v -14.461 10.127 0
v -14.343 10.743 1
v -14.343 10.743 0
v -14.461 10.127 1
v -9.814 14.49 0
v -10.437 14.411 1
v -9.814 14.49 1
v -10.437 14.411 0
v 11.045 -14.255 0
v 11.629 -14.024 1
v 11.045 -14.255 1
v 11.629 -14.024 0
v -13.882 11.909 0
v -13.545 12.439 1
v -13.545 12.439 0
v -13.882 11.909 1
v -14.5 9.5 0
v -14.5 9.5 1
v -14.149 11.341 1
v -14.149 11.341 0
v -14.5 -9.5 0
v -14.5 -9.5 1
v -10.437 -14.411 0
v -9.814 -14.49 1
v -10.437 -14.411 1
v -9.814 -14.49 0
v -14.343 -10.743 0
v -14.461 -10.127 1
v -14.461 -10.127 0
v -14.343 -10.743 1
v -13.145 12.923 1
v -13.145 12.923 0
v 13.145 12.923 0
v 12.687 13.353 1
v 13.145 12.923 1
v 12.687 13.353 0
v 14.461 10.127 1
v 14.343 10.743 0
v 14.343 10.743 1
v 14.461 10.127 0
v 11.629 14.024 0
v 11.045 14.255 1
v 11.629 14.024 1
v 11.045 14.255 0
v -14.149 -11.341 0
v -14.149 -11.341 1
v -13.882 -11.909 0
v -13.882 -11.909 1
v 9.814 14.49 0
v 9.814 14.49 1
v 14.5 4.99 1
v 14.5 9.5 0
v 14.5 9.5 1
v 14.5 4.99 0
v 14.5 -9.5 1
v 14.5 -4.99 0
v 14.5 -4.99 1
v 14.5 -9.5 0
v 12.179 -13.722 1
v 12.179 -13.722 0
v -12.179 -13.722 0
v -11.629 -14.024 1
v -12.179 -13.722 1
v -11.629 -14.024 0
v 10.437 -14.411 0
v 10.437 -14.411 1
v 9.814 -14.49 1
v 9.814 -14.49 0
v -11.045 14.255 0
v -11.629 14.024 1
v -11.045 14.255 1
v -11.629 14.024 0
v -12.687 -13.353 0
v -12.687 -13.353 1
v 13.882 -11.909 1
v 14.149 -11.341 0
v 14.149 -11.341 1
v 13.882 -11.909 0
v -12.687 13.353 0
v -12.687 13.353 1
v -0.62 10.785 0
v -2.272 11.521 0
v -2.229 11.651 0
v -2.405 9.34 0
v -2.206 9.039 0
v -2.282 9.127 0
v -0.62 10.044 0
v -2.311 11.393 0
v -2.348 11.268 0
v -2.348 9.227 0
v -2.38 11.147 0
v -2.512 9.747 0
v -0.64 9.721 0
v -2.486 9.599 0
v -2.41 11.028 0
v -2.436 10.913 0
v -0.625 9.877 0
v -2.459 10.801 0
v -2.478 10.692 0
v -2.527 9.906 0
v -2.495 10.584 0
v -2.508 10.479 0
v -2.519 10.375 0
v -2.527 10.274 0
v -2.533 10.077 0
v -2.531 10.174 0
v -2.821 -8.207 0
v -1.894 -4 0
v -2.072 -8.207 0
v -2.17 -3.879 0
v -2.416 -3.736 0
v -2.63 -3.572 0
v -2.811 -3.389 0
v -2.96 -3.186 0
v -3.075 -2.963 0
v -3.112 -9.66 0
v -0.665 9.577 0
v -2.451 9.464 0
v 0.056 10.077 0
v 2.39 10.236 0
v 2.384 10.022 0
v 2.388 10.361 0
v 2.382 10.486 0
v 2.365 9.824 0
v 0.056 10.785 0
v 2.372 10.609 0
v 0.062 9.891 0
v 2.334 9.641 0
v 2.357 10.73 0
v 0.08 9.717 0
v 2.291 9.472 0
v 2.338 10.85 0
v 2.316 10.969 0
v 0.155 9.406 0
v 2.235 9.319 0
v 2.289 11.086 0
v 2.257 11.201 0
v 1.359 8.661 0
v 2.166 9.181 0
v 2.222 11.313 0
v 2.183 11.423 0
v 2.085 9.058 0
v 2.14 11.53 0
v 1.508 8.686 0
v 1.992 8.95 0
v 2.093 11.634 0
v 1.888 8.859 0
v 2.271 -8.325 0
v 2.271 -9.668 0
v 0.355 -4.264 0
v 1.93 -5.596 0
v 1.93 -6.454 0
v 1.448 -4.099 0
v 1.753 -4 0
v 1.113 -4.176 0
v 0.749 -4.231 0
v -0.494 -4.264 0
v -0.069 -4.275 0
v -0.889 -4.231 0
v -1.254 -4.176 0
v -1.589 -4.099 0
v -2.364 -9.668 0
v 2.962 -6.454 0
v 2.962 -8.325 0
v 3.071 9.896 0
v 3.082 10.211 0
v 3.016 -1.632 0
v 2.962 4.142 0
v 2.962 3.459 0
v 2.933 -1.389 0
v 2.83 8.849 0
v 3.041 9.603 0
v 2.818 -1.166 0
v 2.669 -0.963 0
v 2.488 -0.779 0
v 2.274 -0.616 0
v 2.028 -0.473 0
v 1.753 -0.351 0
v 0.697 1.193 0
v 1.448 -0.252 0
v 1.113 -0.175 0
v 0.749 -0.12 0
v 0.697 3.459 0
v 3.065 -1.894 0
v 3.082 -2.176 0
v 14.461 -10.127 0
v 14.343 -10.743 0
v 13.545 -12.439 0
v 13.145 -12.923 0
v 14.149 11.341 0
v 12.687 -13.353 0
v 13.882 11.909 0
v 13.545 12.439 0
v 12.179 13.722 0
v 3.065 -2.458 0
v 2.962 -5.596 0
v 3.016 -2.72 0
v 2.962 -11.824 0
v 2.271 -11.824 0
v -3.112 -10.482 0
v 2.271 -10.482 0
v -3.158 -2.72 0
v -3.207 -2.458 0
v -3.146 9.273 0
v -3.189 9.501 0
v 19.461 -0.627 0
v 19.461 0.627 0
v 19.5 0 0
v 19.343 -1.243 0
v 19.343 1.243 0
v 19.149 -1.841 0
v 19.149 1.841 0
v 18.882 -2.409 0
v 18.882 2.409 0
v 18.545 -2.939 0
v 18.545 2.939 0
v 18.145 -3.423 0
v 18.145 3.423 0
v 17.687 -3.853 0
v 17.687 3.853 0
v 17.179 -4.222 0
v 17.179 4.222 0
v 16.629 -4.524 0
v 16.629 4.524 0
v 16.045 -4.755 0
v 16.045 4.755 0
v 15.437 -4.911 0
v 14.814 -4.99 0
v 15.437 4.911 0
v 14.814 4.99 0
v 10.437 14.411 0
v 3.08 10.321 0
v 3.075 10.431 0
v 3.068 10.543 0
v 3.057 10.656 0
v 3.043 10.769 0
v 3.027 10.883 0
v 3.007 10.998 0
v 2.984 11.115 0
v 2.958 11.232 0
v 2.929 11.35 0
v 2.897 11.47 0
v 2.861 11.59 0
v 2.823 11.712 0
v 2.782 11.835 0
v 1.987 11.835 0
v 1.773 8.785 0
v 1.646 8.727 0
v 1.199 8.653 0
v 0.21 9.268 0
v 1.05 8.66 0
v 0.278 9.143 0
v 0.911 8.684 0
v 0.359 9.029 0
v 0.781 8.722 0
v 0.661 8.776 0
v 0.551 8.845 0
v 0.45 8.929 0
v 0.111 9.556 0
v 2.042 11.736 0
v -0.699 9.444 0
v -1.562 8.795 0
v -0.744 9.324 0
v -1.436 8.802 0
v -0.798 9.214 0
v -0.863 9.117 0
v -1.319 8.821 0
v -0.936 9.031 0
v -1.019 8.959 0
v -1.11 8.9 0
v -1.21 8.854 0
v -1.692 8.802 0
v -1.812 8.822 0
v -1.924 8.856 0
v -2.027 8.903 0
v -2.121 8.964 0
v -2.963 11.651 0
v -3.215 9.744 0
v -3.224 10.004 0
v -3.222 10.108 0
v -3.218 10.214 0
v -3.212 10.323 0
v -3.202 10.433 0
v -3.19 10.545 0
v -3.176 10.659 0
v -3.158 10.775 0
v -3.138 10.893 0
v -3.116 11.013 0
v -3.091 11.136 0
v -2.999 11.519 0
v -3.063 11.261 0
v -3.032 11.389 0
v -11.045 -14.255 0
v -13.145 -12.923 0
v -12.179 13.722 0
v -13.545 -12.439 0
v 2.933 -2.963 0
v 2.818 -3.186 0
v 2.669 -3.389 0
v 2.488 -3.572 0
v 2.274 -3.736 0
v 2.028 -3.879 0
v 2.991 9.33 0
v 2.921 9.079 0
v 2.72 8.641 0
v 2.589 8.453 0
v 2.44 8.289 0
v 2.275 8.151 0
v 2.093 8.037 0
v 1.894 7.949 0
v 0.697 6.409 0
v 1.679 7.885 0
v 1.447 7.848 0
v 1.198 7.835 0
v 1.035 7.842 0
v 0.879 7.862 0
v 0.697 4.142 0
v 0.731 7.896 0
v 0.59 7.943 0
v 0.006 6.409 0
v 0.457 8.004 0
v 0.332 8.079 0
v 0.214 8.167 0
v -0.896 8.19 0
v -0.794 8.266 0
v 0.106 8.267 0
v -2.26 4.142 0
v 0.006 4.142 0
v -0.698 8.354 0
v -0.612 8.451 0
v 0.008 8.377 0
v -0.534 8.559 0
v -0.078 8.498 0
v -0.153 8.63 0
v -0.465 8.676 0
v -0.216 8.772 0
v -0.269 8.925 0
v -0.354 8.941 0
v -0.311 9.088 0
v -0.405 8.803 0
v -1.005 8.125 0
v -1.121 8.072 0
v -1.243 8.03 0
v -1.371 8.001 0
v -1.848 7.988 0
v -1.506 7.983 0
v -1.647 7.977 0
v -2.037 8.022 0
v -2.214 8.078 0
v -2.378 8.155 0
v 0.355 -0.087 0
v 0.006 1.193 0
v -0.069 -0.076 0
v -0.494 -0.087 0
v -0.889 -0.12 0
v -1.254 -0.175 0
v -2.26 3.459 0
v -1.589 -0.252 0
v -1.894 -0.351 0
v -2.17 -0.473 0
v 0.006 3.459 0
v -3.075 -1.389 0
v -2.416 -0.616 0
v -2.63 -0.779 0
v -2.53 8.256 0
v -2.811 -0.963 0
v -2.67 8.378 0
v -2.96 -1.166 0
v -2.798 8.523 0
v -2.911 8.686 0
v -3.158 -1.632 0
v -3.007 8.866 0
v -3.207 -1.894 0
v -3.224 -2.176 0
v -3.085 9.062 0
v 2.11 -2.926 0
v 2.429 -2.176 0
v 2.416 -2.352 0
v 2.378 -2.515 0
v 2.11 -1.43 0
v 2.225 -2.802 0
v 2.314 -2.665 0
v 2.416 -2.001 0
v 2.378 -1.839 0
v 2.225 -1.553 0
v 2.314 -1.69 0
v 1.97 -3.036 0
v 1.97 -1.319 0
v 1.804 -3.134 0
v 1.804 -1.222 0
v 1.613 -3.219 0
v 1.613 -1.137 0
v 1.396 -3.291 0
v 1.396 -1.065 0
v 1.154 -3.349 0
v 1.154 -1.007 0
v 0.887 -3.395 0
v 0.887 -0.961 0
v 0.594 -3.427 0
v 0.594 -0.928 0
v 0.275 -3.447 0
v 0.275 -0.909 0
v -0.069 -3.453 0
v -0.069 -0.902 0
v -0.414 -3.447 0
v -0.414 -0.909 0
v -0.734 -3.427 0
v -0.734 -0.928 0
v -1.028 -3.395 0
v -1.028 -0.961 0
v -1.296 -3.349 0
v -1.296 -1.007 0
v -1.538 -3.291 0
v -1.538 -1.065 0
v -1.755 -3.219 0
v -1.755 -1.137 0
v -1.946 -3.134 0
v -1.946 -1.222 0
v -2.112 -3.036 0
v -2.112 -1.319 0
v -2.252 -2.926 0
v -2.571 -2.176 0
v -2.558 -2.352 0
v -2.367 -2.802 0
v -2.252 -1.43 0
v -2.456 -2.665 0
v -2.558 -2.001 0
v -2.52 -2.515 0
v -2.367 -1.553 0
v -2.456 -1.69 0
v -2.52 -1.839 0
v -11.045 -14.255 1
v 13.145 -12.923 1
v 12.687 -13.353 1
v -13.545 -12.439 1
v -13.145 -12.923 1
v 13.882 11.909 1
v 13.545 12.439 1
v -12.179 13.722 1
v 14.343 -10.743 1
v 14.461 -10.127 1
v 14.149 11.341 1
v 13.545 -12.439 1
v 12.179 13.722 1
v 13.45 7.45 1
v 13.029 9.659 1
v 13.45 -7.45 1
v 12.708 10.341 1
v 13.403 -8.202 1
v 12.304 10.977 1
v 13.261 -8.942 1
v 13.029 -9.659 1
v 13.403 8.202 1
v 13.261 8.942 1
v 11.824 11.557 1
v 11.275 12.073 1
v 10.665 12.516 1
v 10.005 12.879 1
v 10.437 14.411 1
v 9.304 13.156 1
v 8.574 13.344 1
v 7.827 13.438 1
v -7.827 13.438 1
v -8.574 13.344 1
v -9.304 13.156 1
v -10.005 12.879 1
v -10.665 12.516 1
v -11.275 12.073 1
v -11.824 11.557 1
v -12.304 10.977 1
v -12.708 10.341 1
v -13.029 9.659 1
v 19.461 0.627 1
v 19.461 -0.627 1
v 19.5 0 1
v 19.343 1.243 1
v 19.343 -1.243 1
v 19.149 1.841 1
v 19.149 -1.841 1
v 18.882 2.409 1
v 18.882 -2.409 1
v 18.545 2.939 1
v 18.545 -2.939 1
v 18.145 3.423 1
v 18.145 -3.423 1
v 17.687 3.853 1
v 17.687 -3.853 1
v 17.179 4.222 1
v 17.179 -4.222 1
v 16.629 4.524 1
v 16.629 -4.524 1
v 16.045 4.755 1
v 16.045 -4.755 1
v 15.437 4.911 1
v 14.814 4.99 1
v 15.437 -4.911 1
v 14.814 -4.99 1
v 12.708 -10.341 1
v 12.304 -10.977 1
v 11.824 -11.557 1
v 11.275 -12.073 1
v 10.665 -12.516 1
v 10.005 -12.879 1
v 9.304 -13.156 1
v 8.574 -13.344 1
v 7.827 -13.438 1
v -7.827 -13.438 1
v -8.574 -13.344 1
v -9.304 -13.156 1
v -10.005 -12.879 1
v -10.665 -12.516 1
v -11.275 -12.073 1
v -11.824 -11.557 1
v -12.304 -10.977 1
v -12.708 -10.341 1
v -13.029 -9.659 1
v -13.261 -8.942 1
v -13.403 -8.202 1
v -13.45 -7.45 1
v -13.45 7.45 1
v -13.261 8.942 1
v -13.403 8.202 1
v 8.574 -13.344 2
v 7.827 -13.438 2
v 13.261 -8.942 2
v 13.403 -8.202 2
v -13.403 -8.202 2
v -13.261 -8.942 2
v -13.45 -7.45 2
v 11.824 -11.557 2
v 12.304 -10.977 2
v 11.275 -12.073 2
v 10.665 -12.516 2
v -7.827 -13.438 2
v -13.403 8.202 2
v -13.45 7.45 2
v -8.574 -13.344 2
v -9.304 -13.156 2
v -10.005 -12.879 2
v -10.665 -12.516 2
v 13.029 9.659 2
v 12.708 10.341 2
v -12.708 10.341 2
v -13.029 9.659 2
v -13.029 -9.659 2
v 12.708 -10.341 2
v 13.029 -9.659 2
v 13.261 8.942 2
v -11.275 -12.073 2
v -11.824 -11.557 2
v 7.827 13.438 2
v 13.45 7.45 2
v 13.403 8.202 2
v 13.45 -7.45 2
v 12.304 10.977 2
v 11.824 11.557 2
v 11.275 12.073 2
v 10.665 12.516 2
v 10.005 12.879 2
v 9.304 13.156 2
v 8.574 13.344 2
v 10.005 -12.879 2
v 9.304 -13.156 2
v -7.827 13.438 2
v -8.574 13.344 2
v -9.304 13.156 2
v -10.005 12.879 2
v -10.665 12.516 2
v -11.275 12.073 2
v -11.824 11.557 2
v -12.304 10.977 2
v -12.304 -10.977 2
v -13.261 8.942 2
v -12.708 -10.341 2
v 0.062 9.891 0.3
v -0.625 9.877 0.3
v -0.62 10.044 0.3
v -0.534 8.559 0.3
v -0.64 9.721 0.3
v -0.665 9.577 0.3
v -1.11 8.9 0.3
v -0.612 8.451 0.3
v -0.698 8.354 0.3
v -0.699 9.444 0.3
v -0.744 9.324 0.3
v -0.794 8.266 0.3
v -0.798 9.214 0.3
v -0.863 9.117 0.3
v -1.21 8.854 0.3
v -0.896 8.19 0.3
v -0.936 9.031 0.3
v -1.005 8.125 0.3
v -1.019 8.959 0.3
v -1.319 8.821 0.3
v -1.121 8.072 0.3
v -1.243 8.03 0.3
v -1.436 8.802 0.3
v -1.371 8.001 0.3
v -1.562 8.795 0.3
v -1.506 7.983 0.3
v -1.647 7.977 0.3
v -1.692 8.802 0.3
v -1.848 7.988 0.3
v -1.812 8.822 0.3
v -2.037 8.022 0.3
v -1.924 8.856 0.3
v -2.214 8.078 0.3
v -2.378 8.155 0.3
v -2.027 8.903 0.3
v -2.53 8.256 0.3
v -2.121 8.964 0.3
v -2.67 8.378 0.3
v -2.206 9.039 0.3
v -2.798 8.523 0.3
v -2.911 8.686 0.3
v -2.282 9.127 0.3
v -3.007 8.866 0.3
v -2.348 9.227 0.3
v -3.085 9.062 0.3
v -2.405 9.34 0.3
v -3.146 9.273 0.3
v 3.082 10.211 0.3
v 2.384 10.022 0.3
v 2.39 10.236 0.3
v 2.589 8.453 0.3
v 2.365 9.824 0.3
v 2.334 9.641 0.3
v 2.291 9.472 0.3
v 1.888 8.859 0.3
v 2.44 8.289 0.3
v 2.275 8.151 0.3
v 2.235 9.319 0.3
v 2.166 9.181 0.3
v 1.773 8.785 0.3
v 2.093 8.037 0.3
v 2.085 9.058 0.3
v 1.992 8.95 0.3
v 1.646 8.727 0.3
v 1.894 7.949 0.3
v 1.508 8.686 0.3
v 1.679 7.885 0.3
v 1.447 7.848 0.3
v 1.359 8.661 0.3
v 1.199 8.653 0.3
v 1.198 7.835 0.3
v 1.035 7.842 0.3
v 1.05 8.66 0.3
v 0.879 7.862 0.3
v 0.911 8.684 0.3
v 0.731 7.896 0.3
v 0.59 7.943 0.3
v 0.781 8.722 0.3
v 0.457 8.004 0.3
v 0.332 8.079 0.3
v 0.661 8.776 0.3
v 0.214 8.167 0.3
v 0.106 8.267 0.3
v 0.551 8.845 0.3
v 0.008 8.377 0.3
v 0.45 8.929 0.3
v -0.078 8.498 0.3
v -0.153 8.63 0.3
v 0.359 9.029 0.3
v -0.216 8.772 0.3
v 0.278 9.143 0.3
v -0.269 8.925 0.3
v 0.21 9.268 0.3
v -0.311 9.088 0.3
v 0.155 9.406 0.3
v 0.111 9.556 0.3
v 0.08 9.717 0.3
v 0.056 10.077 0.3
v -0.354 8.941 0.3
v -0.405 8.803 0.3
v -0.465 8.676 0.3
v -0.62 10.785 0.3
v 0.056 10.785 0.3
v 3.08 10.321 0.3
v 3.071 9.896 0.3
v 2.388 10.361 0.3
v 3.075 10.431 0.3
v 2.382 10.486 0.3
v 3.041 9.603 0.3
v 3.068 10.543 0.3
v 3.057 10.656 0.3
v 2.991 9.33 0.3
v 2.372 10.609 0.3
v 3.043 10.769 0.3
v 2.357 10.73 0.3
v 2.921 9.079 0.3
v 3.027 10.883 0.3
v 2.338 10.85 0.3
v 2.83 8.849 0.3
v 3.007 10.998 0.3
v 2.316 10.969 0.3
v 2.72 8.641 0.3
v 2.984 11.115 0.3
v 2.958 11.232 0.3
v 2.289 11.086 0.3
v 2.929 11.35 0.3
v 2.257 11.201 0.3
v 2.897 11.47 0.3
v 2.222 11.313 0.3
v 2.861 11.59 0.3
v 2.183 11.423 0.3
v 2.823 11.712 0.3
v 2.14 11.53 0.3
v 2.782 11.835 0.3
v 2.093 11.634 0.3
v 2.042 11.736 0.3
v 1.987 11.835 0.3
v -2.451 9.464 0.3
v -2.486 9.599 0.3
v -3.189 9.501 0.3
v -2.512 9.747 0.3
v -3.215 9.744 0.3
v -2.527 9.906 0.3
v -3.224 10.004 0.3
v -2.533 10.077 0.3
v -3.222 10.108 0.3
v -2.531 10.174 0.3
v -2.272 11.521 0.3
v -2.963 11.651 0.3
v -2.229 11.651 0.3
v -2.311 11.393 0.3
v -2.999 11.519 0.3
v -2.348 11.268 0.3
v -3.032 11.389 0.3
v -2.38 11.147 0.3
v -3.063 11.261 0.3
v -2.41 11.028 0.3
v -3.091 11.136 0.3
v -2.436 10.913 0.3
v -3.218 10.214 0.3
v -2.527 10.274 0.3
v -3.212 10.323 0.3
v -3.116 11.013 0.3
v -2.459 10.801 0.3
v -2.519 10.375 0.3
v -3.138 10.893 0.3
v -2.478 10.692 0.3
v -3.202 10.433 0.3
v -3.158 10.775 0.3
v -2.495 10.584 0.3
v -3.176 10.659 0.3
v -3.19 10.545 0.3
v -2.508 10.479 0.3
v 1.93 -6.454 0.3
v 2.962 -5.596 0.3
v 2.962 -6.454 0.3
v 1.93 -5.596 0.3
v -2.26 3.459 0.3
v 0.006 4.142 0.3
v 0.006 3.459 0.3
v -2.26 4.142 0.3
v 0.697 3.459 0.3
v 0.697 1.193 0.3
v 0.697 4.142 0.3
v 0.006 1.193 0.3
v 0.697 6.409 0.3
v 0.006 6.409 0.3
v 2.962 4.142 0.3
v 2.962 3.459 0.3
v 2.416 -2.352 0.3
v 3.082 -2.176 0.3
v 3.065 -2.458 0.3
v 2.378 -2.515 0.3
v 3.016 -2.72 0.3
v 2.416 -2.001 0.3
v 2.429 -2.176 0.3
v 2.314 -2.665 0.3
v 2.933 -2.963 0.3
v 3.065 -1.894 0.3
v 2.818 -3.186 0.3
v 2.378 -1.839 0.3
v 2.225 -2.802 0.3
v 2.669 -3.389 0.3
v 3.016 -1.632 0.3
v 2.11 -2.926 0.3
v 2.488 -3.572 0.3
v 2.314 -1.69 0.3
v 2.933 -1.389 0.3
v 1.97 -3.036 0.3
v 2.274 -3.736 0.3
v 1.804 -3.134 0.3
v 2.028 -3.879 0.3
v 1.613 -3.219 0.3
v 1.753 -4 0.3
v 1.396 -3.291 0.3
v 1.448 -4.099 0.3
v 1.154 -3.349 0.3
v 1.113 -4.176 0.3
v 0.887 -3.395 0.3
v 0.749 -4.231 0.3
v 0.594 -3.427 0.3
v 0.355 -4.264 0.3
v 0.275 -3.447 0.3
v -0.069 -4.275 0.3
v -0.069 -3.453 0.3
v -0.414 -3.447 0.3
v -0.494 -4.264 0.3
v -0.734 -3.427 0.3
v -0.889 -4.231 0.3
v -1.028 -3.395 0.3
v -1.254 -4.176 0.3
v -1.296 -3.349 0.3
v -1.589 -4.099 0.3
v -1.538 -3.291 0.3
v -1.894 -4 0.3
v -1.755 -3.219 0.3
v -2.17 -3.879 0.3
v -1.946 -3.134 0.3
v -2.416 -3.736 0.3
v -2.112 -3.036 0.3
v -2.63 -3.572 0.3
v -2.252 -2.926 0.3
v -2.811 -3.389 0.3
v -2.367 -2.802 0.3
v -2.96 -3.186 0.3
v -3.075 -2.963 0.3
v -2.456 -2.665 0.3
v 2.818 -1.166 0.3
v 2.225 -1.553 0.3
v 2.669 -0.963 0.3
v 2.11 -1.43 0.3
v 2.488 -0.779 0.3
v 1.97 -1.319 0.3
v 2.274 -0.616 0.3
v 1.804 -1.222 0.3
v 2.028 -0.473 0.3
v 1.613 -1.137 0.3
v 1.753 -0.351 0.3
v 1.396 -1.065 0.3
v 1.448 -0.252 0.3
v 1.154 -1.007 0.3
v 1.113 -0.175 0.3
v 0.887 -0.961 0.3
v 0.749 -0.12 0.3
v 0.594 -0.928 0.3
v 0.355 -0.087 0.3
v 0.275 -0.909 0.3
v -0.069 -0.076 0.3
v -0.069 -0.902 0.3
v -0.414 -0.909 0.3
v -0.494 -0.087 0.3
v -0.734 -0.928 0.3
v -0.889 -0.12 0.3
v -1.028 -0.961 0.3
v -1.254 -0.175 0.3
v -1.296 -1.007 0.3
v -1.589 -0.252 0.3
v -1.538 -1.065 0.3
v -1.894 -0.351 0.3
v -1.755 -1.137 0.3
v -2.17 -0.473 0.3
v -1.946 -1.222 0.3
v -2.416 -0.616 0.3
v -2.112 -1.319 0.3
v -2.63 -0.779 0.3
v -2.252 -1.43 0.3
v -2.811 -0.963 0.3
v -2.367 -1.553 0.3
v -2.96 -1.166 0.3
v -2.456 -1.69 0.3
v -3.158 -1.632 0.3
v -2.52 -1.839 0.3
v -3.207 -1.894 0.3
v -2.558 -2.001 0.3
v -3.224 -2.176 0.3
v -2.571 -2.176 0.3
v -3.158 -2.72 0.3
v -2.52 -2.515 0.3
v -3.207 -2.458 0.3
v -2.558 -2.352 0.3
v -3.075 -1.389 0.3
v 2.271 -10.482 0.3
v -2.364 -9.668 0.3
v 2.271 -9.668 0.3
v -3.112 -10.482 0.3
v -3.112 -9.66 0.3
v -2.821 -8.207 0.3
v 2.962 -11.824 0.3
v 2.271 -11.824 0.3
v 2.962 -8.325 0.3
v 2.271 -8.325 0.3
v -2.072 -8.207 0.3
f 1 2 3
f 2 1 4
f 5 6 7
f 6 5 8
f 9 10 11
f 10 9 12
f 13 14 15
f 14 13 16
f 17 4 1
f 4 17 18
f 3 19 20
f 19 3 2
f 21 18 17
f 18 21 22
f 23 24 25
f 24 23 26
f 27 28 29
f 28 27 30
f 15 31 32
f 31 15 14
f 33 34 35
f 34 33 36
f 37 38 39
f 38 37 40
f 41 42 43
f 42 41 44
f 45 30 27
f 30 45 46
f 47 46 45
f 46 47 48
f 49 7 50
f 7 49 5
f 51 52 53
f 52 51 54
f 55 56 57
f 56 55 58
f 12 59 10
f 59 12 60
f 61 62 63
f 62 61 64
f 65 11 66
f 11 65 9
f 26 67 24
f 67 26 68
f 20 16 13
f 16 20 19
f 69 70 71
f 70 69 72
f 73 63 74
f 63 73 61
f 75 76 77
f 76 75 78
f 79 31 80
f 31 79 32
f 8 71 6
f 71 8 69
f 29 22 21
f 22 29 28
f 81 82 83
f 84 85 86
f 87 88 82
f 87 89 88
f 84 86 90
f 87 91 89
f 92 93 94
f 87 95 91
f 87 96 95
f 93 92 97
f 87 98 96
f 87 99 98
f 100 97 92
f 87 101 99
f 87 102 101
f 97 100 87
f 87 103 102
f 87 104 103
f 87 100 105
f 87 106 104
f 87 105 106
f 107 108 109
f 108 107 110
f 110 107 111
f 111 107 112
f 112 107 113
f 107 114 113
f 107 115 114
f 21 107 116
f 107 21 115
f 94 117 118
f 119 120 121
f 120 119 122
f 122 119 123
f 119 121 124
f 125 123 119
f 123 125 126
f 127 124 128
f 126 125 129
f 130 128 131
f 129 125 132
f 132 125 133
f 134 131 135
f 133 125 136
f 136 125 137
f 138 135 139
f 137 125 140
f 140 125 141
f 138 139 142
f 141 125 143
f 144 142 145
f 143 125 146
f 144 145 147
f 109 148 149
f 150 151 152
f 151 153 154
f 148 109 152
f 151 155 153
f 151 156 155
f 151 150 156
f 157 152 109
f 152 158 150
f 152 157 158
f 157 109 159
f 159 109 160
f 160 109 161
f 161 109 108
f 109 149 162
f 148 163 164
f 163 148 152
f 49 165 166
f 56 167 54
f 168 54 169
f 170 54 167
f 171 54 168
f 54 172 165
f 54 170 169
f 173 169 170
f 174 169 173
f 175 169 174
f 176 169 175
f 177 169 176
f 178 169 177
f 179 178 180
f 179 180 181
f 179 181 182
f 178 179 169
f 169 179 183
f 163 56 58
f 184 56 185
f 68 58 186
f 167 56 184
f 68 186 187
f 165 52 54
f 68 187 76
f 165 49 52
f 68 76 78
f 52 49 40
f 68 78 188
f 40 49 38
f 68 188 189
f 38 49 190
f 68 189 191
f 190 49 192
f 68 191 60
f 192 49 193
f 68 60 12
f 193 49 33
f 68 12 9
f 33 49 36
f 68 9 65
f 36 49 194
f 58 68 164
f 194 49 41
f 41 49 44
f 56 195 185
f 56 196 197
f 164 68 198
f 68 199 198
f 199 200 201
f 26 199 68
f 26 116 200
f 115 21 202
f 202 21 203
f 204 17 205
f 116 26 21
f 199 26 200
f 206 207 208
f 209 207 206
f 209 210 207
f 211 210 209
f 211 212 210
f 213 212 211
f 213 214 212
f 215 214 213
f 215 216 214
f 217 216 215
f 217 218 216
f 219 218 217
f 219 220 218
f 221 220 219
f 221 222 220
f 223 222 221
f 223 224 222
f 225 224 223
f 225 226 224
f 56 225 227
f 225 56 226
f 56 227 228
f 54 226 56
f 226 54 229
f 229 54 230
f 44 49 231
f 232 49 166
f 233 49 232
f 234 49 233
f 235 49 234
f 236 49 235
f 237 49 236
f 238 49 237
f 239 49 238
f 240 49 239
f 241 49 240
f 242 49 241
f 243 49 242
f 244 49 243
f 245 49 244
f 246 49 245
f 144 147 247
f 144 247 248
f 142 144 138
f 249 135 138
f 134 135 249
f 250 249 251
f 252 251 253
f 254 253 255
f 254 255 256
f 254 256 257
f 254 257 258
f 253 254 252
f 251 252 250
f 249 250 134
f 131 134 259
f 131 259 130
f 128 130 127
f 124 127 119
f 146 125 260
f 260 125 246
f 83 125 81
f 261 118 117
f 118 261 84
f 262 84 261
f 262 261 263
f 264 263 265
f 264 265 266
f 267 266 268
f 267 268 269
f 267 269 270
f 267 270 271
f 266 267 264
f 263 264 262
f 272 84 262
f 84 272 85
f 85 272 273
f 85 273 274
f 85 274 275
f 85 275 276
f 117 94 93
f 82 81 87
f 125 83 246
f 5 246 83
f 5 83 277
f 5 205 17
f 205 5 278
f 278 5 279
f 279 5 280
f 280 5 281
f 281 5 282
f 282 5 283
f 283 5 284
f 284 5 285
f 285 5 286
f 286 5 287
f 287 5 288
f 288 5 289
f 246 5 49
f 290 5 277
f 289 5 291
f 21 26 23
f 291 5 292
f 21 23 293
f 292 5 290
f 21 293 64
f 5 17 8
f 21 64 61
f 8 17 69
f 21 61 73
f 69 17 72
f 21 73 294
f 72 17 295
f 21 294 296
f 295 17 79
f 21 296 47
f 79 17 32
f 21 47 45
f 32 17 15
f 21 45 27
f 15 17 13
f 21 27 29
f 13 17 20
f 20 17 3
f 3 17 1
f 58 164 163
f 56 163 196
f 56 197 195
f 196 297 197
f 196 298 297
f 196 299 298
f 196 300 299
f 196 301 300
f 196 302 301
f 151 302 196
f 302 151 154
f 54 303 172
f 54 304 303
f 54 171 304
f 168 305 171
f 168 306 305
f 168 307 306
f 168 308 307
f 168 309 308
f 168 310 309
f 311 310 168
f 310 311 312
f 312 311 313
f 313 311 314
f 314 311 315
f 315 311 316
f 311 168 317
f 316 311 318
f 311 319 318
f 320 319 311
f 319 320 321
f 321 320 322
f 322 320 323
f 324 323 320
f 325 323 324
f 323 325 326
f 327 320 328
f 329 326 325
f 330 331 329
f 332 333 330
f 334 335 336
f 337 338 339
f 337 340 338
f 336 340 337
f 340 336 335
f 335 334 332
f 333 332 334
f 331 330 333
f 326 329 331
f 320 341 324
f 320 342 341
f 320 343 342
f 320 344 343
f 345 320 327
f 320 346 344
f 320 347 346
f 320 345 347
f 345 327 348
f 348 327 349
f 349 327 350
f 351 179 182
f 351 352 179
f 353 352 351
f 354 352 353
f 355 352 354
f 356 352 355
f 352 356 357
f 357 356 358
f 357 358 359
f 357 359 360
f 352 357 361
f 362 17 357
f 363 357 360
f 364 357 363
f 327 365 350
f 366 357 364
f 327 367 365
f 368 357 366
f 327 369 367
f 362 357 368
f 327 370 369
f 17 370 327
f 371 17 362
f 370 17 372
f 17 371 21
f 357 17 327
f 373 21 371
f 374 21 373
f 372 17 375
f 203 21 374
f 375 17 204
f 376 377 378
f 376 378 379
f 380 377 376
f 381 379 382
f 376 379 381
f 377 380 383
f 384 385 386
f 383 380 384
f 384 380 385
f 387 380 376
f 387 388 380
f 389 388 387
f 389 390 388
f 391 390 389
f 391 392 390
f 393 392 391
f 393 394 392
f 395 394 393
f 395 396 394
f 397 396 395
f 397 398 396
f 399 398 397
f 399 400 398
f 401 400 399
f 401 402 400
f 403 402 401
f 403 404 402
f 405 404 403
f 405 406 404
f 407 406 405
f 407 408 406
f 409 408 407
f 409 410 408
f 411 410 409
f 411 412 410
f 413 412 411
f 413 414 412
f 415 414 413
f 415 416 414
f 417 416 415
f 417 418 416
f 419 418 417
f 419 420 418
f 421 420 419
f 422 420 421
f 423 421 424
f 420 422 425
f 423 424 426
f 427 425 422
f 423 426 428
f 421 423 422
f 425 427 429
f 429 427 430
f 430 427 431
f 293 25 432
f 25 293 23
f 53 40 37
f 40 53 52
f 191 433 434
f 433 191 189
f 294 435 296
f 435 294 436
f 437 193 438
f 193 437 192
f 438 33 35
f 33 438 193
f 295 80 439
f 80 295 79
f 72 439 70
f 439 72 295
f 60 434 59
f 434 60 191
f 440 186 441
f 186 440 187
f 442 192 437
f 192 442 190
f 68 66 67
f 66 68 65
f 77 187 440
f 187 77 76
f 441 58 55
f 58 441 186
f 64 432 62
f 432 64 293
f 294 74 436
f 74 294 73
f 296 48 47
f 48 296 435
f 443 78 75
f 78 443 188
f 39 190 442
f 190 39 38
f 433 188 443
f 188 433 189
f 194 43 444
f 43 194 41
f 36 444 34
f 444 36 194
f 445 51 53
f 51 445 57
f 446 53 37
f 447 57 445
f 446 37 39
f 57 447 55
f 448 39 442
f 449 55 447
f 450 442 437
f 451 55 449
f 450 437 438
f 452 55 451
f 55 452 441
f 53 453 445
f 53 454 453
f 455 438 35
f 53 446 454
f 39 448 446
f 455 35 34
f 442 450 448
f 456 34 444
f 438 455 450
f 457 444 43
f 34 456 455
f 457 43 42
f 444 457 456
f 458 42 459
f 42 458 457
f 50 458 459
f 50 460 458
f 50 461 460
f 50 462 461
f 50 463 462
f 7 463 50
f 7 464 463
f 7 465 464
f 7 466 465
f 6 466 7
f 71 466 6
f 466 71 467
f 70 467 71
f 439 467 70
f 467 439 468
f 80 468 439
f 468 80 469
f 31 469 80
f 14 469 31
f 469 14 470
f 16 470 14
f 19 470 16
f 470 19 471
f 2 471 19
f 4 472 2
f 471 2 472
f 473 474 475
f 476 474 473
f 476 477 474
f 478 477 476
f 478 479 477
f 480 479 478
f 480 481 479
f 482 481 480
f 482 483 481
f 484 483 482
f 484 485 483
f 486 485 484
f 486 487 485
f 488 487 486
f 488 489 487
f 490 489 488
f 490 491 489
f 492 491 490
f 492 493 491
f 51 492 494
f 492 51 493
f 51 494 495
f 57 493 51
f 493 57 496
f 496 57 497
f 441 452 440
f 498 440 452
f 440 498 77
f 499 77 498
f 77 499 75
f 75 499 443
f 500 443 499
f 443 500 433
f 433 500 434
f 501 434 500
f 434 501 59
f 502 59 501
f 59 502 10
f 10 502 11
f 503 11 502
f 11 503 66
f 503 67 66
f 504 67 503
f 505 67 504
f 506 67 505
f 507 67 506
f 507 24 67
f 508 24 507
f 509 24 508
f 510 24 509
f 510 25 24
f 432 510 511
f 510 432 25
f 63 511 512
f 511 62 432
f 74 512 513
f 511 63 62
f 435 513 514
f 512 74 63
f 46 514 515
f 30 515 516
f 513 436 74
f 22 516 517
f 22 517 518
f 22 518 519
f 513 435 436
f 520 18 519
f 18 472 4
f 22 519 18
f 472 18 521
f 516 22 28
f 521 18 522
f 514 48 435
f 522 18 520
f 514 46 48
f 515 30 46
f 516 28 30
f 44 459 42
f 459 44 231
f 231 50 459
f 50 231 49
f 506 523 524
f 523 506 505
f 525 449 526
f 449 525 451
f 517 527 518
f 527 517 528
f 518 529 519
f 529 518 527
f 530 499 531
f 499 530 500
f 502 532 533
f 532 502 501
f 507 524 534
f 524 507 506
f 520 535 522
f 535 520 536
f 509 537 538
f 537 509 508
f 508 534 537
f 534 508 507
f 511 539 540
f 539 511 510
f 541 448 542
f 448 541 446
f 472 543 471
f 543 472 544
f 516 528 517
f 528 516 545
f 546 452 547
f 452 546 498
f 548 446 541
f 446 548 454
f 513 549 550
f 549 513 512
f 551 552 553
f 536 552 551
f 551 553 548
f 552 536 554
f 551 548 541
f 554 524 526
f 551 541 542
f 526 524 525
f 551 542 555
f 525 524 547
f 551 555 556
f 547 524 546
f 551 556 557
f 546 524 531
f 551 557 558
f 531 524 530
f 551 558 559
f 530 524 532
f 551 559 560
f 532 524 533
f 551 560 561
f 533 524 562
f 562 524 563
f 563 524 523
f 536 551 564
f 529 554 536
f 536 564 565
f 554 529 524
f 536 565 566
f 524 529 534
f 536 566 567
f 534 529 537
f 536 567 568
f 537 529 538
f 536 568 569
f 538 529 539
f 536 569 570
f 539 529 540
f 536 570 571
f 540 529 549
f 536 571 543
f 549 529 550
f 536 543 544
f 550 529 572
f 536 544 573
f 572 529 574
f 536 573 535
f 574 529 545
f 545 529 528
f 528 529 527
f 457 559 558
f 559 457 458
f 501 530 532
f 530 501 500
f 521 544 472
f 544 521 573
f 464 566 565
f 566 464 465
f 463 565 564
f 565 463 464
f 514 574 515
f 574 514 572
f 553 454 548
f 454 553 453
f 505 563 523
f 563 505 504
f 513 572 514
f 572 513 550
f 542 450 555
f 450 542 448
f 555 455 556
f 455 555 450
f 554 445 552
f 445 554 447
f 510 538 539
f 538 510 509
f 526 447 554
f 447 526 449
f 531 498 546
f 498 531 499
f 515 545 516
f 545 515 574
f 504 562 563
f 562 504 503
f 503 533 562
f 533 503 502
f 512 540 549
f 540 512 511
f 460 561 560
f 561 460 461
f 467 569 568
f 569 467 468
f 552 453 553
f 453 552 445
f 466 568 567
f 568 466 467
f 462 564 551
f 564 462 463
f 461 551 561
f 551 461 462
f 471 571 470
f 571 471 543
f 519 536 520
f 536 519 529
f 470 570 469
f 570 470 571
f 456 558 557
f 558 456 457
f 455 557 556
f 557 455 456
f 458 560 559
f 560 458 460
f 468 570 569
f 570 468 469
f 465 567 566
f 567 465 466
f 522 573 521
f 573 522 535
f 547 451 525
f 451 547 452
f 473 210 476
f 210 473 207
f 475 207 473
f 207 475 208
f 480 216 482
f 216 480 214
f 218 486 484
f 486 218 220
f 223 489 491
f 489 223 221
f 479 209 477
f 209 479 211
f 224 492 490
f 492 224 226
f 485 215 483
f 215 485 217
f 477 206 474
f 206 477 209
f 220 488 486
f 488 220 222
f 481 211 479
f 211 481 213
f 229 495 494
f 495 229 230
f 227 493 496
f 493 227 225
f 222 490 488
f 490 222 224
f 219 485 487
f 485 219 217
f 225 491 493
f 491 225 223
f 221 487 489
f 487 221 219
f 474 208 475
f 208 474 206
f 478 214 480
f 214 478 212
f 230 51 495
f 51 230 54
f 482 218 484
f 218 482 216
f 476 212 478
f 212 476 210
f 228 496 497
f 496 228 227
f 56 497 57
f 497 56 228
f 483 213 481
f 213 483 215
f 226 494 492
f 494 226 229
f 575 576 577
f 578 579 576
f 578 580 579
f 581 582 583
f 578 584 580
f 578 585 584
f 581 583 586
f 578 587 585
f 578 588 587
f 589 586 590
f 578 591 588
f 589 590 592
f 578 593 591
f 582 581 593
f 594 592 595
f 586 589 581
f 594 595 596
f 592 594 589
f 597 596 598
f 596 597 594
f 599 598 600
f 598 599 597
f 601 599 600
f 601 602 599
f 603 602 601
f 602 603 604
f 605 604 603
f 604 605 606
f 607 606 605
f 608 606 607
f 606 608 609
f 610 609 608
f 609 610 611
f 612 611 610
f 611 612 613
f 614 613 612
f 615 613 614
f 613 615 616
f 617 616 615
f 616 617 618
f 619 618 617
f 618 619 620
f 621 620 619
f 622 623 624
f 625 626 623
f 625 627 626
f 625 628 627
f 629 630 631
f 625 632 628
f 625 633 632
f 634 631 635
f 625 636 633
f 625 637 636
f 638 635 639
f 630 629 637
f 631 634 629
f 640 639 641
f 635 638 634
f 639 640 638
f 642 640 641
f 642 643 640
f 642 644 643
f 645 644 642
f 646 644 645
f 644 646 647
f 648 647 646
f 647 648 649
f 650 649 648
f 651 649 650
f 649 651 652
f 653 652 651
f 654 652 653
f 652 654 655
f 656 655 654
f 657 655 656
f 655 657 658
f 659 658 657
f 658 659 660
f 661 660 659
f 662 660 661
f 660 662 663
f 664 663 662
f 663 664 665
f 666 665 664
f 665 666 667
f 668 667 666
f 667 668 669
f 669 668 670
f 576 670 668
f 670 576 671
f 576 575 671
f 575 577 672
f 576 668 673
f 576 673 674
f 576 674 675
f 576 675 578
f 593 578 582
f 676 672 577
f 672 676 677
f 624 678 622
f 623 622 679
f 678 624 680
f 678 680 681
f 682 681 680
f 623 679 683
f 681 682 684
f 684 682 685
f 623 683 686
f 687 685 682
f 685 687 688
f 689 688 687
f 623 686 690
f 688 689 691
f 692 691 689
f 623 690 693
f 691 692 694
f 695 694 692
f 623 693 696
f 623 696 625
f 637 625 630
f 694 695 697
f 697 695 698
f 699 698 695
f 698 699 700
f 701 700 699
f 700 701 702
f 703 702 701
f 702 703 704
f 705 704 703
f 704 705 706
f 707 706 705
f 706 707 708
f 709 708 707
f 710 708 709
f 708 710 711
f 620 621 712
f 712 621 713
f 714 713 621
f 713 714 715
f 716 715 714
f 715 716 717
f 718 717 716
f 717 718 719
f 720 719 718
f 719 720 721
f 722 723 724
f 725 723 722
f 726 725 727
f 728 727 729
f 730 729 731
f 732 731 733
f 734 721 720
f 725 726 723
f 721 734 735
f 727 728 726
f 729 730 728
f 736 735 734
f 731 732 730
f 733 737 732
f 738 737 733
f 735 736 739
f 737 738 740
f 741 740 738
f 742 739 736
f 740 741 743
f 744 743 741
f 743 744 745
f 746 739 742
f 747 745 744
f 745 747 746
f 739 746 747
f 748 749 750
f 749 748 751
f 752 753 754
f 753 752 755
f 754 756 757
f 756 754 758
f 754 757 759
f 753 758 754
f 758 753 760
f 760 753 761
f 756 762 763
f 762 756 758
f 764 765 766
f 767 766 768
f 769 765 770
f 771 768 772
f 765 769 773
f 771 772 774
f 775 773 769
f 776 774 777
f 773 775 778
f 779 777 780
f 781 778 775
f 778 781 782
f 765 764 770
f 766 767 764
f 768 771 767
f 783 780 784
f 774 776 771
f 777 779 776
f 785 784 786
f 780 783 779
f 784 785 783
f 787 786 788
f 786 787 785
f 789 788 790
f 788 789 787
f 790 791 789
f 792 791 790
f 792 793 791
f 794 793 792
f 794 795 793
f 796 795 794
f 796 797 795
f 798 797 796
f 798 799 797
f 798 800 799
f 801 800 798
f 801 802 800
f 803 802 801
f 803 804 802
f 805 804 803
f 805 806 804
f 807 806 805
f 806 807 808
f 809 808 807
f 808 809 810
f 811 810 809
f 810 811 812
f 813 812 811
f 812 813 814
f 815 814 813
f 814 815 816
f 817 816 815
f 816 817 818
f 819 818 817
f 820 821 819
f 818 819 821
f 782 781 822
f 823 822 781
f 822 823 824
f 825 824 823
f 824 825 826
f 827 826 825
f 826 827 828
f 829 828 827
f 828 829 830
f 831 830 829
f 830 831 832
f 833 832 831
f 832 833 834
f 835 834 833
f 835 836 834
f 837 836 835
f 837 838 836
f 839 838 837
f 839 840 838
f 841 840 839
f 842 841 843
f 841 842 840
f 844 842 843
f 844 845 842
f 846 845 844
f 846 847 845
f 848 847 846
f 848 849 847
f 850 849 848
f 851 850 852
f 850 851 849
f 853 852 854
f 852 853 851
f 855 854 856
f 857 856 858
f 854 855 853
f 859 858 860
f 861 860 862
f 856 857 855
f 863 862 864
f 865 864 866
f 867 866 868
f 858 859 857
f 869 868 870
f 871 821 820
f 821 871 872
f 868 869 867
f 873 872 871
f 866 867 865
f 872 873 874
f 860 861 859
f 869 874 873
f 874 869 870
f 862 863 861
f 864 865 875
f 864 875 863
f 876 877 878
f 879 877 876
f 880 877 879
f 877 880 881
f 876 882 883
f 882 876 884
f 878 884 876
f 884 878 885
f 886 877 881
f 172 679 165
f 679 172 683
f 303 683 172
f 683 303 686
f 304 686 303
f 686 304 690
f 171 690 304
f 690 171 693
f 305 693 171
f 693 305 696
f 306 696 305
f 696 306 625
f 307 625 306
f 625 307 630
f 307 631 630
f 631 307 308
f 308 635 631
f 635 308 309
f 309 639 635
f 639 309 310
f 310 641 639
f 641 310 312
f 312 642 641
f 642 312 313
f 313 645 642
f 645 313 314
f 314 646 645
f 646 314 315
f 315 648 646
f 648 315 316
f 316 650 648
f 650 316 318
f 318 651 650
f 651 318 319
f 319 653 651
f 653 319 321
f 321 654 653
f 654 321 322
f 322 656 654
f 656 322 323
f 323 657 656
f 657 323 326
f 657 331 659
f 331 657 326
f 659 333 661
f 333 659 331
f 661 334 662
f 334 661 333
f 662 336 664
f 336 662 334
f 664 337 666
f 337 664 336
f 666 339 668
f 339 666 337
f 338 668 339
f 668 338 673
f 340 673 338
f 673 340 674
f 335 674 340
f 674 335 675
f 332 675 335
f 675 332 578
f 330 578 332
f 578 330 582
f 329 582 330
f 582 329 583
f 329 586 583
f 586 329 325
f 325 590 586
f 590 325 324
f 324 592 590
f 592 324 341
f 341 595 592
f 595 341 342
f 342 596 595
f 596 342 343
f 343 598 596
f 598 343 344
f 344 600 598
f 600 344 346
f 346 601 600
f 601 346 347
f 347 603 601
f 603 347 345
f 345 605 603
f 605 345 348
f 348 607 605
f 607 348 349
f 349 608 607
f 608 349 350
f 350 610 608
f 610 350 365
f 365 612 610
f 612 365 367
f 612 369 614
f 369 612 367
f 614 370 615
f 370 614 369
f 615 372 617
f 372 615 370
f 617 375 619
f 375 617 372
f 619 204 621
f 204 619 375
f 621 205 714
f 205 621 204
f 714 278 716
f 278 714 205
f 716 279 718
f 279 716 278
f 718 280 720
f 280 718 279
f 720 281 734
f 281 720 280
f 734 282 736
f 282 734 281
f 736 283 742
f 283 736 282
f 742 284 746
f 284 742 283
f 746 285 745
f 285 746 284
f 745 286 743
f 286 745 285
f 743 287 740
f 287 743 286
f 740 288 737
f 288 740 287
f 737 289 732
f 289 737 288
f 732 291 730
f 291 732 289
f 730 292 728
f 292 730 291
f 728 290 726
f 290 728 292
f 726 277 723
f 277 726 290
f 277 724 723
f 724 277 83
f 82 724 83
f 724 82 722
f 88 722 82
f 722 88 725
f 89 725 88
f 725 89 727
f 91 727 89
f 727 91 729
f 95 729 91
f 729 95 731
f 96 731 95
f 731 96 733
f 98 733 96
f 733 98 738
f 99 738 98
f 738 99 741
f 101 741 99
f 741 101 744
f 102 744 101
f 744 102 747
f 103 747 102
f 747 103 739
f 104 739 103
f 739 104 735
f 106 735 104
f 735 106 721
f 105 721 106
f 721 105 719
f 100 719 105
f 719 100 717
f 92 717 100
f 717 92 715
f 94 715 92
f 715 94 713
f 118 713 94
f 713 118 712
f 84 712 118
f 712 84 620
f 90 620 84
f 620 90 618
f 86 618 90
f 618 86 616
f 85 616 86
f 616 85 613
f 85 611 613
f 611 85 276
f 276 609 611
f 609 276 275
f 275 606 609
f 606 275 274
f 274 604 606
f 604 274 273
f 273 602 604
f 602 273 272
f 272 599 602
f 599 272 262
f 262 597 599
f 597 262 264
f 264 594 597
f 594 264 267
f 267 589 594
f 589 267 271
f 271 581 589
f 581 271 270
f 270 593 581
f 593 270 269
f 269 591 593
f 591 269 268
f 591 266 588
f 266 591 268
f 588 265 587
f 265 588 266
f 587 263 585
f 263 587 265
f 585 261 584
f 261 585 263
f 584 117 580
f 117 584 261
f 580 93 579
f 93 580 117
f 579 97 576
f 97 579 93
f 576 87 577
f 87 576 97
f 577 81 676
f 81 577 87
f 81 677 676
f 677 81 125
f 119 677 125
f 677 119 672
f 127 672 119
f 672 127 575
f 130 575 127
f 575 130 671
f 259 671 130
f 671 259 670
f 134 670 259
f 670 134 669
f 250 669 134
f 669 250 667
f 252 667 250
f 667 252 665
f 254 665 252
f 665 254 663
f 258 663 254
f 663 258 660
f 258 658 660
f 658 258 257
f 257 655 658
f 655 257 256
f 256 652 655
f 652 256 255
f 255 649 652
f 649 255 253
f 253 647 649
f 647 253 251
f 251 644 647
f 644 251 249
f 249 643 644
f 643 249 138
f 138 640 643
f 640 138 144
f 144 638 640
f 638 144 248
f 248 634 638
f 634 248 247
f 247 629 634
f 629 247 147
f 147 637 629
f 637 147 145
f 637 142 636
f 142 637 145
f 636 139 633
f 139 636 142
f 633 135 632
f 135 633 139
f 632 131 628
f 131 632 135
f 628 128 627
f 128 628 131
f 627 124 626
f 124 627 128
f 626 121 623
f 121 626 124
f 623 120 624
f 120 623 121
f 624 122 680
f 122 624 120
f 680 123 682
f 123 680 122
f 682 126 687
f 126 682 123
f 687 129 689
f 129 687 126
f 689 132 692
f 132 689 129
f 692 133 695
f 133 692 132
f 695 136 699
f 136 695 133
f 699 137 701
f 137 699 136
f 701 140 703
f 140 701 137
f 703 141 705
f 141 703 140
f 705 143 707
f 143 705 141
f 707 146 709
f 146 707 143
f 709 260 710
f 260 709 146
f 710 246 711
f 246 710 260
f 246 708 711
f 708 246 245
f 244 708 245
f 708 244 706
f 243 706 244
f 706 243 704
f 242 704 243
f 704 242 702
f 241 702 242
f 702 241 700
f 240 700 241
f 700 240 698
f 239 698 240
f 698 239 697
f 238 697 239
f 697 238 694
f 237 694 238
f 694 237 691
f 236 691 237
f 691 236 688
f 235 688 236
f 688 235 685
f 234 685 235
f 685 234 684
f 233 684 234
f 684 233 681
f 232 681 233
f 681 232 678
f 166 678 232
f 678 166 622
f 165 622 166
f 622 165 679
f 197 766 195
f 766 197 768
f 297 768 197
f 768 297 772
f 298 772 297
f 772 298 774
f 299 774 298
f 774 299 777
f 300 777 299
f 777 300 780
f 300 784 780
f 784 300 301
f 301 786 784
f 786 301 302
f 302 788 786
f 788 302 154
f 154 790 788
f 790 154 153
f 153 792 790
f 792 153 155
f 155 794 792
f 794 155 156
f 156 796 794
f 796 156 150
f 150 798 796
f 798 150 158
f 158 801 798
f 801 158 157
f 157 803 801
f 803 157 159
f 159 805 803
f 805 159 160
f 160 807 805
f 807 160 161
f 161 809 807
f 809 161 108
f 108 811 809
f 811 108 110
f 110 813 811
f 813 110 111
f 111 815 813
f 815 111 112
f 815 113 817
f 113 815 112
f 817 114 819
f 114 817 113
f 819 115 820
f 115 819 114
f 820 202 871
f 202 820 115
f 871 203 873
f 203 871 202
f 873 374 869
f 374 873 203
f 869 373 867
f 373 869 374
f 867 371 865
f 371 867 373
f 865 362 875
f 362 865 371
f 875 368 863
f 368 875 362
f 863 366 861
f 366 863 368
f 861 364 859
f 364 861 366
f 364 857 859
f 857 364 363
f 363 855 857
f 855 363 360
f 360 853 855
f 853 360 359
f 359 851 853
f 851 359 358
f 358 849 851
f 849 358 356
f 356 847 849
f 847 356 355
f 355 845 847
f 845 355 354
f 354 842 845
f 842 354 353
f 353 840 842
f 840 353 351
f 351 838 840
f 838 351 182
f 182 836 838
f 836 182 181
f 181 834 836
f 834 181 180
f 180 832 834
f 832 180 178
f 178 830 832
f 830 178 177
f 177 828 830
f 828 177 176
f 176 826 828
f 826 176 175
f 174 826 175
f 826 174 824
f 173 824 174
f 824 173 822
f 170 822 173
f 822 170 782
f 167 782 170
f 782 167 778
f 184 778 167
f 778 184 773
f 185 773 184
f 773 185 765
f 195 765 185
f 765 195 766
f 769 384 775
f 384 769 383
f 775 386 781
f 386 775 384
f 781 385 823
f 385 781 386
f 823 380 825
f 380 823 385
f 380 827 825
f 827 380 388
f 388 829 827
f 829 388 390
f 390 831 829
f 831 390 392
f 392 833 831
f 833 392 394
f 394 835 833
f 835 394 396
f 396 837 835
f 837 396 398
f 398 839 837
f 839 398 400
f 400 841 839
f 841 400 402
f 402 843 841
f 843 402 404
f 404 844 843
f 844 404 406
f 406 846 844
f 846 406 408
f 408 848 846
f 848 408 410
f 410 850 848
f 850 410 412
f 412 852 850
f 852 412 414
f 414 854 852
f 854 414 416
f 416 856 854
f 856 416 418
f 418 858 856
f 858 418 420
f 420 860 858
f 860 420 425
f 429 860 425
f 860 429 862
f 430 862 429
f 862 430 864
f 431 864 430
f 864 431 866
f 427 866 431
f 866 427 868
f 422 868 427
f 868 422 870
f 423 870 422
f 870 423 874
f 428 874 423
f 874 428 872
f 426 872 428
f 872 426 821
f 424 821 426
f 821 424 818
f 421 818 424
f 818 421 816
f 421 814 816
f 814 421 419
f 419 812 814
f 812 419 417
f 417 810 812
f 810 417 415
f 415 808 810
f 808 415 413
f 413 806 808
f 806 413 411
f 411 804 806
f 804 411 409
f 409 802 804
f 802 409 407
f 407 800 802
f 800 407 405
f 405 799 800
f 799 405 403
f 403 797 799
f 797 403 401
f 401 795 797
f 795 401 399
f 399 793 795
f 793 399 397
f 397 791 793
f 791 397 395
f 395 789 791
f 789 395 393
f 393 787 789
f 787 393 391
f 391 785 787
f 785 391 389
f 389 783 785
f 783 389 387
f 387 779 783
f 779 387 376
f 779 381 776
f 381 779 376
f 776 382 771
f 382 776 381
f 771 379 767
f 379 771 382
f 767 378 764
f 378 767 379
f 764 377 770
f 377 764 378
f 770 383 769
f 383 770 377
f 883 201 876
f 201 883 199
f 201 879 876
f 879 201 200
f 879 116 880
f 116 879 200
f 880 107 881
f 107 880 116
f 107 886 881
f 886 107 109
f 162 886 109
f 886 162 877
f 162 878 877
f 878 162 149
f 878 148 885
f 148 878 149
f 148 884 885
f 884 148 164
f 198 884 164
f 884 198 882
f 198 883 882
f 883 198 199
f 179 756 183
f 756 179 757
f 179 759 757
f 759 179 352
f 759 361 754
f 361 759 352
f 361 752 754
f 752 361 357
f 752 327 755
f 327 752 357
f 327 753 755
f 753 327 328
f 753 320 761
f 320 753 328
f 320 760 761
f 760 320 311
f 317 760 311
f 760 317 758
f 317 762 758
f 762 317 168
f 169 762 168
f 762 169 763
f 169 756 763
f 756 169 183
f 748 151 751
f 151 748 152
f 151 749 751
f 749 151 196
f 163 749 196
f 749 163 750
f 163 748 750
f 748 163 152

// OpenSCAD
$fn = 50;


difference() {
	union() {
		translate(v = [0, 0, 0]) {
			rotate(a = [0, 0, 0]) {
				hull() {
					translate(v = [-9.5000000000, 9.5000000000, 0]) {
						rotate(a = [0, 0, 0]) {
							translate(v = [0, 0, 0]) {
								rotate(a = [0, 0, 0]) {
									cylinder(h = 1, r = 5);
								}
							}
						}
					}
					translate(v = [9.5000000000, 9.5000000000, 0]) {
						rotate(a = [0, 0, 0]) {
							translate(v = [0, 0, 0]) {
								rotate(a = [0, 0, 0]) {
									cylinder(h = 1, r = 5);
								}
							}
						}
					}
					translate(v = [-9.5000000000, -9.5000000000, 0]) {
						rotate(a = [0, 0, 0]) {
							translate(v = [0, 0, 0]) {
								rotate(a = [0, 0, 0]) {
									cylinder(h = 1, r = 5);
								}
							}
						}
					}
					translate(v = [9.5000000000, -9.5000000000, 0]) {
						rotate(a = [0, 0, 0]) {
							translate(v = [0, 0, 0]) {
								rotate(a = [0, 0, 0]) {
									cylinder(h = 1, r = 5);
								}
							}
						}
					}
				}
			}
		}
		translate(v = [0, 0, 0]) {
			rotate(a = [0, 0, 0]) {
				hull() {
					translate(v = [-7.4500000000, 7.4500000000, 0]) {
						rotate(a = [0, 0, 0]) {
							translate(v = [0, 0, 0]) {
								rotate(a = [0, 0, 0]) {
									cylinder(h = 2, r = 6);
								}
							}
						}
					}
					translate(v = [7.4500000000, 7.4500000000, 0]) {
						rotate(a = [0, 0, 0]) {
							translate(v = [0, 0, 0]) {
								rotate(a = [0, 0, 0]) {
									cylinder(h = 2, r = 6);
								}
							}
						}
					}
					translate(v = [-7.4500000000, -7.4500000000, 0]) {
						rotate(a = [0, 0, 0]) {
							translate(v = [0, 0, 0]) {
								rotate(a = [0, 0, 0]) {
									cylinder(h = 2, r = 6);
								}
							}
						}
					}
					translate(v = [7.4500000000, -7.4500000000, 0]) {
						rotate(a = [0, 0, 0]) {
							translate(v = [0, 0, 0]) {
								rotate(a = [0, 0, 0]) {
									cylinder(h = 2, r = 6);
								}
							}
						}
					}
				}
			}
		}
		translate(v = [14.5000000000, 0, 0.0000000000]) {
			rotate(a = [0, 0, 0]) {
				cylinder(h = 1, r = 5);
			}
		}
	}
	union() {
		translate(v = [0, 0, 0.3000000000]) {
			rotate(a = [0, 180, 90]) {
				linear_extrude(height = 0.3000000000) {
					text(font = "Candara:Light", halign = "center", size = 6, text = "3+0.1", valign = "center");
				}
			}
		}
	}
}
